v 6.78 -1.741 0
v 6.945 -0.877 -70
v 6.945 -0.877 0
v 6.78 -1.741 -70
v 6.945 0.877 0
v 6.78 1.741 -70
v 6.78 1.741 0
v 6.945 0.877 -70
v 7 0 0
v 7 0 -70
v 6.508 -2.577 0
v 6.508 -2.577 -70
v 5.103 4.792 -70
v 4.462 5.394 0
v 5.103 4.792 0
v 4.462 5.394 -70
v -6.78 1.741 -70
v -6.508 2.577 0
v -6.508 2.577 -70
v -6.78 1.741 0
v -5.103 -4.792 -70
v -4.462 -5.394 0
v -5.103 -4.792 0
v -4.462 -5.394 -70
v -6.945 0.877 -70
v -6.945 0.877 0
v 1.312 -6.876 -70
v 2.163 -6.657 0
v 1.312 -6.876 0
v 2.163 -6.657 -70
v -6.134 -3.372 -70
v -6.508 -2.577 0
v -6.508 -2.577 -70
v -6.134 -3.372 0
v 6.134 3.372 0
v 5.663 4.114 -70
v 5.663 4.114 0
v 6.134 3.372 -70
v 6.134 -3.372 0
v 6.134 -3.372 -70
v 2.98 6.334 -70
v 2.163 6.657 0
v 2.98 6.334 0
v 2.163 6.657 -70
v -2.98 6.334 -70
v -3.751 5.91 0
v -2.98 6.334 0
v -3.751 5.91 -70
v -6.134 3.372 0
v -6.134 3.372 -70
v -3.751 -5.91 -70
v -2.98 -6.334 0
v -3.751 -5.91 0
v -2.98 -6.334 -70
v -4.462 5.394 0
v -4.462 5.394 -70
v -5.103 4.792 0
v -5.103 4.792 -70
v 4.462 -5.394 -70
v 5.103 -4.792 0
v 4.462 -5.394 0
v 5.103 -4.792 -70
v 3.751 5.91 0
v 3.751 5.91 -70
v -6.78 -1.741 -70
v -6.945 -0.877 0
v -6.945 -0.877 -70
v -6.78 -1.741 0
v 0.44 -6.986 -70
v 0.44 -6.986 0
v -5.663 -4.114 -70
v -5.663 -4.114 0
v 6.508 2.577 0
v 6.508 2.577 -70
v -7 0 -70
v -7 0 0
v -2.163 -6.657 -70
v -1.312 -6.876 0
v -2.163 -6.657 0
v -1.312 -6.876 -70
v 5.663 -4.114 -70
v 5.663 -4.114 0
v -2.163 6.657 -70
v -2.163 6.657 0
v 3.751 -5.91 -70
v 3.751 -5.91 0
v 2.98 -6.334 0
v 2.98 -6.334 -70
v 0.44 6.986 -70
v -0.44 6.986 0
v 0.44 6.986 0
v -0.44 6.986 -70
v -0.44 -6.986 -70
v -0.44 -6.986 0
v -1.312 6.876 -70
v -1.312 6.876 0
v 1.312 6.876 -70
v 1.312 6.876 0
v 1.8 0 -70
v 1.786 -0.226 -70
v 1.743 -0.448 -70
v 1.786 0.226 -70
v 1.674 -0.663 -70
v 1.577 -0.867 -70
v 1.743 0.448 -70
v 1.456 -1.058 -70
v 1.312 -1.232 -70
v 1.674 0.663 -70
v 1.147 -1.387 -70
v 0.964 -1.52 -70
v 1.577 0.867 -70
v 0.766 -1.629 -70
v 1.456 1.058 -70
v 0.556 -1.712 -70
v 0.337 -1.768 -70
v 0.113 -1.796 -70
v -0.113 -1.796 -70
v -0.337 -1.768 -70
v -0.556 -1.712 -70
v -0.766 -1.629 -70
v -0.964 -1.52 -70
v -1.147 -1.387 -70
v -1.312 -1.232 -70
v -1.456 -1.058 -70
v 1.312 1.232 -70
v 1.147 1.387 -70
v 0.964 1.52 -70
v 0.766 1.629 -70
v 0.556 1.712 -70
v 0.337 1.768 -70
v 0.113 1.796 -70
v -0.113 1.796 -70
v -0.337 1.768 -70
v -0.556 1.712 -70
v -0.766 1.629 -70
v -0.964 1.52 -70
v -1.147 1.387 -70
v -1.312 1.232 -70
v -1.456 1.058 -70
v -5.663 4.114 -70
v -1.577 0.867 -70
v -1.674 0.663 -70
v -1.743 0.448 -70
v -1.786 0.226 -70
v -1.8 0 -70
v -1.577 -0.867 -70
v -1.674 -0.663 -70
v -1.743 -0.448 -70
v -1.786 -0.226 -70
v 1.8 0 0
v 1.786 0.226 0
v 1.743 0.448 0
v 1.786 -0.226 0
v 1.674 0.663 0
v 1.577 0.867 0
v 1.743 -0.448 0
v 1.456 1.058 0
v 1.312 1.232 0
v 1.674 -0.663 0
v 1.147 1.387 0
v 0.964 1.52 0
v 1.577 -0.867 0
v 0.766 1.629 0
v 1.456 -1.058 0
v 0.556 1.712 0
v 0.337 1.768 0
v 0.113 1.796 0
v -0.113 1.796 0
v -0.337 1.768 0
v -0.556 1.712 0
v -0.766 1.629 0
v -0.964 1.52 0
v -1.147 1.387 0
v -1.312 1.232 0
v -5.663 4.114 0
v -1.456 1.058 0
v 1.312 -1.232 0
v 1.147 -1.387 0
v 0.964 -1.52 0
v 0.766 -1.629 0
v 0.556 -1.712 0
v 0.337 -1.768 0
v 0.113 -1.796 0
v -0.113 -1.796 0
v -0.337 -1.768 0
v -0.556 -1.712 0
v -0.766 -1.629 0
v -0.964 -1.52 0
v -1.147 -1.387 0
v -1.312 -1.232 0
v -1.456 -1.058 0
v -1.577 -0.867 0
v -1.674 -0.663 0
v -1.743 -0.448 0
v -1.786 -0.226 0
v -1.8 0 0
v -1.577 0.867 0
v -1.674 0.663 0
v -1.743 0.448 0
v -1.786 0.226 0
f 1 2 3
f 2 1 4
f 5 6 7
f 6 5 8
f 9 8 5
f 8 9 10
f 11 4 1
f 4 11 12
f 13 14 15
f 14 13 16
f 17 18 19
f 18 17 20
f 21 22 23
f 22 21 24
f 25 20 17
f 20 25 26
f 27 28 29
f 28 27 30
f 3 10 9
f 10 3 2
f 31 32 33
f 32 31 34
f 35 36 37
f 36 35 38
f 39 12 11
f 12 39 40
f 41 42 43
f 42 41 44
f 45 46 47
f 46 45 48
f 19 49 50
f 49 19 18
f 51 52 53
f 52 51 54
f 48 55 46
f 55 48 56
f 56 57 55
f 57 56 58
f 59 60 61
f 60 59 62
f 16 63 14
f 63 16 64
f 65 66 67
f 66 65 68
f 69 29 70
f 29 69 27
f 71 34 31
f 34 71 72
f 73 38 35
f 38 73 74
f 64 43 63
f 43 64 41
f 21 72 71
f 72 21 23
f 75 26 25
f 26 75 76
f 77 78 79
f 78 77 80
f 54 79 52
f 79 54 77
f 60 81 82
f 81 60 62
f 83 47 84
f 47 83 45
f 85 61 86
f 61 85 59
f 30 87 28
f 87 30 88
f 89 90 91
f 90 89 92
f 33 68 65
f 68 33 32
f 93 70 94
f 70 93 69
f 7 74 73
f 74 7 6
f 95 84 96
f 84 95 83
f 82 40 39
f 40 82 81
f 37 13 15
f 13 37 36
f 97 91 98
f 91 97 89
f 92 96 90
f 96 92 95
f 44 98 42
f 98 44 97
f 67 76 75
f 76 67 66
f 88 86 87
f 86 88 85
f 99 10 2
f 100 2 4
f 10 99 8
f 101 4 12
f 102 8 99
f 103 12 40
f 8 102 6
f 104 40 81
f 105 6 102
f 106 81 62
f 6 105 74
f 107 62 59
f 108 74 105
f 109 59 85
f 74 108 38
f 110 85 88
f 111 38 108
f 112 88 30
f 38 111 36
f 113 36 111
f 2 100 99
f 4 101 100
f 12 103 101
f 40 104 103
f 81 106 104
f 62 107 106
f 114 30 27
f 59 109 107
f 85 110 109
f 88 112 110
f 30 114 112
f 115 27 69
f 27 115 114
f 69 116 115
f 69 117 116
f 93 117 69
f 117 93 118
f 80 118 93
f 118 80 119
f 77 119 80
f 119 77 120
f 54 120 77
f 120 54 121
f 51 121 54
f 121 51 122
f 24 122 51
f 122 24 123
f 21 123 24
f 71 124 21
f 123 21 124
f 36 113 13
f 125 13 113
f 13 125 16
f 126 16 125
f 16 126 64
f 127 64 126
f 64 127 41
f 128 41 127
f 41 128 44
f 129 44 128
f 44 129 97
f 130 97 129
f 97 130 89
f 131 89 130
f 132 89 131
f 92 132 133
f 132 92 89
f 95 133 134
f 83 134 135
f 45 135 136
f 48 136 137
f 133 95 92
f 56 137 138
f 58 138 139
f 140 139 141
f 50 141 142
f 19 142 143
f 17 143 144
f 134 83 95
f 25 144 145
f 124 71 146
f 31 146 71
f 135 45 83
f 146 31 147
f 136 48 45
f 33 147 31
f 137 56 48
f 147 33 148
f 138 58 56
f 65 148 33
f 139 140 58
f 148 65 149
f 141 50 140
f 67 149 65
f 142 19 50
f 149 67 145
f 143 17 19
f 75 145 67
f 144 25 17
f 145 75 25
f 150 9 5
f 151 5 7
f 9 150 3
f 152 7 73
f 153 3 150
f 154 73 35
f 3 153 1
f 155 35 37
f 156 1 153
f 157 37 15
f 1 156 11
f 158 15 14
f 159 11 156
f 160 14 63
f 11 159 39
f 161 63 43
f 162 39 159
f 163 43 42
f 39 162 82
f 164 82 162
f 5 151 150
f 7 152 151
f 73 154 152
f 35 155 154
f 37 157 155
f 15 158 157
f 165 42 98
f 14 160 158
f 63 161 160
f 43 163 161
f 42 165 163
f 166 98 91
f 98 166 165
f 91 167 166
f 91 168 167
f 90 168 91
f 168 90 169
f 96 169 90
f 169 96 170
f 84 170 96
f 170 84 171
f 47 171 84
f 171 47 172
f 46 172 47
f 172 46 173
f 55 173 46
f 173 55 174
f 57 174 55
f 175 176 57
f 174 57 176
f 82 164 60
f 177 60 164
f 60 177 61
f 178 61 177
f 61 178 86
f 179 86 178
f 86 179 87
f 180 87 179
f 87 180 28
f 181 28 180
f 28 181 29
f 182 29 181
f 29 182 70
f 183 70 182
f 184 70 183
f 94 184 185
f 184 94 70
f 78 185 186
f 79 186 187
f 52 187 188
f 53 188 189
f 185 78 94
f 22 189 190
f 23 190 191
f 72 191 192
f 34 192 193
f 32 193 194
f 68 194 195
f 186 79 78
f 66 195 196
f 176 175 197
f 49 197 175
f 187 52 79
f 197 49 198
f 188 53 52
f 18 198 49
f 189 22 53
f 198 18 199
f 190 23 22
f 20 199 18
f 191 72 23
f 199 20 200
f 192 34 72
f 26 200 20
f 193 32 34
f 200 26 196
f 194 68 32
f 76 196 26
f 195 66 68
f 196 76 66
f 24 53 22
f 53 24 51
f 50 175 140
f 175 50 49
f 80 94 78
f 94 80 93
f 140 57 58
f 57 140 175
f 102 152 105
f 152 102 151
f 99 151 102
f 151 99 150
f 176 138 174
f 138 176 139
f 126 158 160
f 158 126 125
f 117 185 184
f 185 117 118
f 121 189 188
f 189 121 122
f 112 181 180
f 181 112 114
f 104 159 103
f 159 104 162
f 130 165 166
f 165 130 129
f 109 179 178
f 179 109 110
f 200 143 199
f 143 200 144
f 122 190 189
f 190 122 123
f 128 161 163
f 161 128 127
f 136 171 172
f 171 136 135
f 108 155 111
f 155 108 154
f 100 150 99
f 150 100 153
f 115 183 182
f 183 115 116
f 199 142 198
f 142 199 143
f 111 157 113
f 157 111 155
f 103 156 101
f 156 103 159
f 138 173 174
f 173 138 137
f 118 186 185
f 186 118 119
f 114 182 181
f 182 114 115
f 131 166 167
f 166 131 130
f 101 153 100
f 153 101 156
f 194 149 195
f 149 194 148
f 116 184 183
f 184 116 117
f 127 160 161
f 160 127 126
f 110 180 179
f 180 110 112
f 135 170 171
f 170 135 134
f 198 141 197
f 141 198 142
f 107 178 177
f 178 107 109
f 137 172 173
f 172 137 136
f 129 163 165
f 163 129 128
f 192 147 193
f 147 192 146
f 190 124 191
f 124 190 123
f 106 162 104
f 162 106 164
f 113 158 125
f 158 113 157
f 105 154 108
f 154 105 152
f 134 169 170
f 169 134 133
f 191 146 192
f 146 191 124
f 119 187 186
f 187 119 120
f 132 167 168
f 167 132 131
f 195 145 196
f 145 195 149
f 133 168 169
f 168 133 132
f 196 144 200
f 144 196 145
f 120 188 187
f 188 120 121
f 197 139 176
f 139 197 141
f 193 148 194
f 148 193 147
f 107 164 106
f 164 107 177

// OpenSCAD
$fn = 50;


difference() {
	union() {
		translate(v = [0, 0, -70.0000000000]) {
			cylinder(h = 70, r = 7.0000000000);
		}
		cylinder(h = 0, r = 13.0000000000);
	}
	union() {
		#translate(v = [0, 0, -70]) {
			cylinder(h = 70, r = 1.8000000000);
		}
	}
}
